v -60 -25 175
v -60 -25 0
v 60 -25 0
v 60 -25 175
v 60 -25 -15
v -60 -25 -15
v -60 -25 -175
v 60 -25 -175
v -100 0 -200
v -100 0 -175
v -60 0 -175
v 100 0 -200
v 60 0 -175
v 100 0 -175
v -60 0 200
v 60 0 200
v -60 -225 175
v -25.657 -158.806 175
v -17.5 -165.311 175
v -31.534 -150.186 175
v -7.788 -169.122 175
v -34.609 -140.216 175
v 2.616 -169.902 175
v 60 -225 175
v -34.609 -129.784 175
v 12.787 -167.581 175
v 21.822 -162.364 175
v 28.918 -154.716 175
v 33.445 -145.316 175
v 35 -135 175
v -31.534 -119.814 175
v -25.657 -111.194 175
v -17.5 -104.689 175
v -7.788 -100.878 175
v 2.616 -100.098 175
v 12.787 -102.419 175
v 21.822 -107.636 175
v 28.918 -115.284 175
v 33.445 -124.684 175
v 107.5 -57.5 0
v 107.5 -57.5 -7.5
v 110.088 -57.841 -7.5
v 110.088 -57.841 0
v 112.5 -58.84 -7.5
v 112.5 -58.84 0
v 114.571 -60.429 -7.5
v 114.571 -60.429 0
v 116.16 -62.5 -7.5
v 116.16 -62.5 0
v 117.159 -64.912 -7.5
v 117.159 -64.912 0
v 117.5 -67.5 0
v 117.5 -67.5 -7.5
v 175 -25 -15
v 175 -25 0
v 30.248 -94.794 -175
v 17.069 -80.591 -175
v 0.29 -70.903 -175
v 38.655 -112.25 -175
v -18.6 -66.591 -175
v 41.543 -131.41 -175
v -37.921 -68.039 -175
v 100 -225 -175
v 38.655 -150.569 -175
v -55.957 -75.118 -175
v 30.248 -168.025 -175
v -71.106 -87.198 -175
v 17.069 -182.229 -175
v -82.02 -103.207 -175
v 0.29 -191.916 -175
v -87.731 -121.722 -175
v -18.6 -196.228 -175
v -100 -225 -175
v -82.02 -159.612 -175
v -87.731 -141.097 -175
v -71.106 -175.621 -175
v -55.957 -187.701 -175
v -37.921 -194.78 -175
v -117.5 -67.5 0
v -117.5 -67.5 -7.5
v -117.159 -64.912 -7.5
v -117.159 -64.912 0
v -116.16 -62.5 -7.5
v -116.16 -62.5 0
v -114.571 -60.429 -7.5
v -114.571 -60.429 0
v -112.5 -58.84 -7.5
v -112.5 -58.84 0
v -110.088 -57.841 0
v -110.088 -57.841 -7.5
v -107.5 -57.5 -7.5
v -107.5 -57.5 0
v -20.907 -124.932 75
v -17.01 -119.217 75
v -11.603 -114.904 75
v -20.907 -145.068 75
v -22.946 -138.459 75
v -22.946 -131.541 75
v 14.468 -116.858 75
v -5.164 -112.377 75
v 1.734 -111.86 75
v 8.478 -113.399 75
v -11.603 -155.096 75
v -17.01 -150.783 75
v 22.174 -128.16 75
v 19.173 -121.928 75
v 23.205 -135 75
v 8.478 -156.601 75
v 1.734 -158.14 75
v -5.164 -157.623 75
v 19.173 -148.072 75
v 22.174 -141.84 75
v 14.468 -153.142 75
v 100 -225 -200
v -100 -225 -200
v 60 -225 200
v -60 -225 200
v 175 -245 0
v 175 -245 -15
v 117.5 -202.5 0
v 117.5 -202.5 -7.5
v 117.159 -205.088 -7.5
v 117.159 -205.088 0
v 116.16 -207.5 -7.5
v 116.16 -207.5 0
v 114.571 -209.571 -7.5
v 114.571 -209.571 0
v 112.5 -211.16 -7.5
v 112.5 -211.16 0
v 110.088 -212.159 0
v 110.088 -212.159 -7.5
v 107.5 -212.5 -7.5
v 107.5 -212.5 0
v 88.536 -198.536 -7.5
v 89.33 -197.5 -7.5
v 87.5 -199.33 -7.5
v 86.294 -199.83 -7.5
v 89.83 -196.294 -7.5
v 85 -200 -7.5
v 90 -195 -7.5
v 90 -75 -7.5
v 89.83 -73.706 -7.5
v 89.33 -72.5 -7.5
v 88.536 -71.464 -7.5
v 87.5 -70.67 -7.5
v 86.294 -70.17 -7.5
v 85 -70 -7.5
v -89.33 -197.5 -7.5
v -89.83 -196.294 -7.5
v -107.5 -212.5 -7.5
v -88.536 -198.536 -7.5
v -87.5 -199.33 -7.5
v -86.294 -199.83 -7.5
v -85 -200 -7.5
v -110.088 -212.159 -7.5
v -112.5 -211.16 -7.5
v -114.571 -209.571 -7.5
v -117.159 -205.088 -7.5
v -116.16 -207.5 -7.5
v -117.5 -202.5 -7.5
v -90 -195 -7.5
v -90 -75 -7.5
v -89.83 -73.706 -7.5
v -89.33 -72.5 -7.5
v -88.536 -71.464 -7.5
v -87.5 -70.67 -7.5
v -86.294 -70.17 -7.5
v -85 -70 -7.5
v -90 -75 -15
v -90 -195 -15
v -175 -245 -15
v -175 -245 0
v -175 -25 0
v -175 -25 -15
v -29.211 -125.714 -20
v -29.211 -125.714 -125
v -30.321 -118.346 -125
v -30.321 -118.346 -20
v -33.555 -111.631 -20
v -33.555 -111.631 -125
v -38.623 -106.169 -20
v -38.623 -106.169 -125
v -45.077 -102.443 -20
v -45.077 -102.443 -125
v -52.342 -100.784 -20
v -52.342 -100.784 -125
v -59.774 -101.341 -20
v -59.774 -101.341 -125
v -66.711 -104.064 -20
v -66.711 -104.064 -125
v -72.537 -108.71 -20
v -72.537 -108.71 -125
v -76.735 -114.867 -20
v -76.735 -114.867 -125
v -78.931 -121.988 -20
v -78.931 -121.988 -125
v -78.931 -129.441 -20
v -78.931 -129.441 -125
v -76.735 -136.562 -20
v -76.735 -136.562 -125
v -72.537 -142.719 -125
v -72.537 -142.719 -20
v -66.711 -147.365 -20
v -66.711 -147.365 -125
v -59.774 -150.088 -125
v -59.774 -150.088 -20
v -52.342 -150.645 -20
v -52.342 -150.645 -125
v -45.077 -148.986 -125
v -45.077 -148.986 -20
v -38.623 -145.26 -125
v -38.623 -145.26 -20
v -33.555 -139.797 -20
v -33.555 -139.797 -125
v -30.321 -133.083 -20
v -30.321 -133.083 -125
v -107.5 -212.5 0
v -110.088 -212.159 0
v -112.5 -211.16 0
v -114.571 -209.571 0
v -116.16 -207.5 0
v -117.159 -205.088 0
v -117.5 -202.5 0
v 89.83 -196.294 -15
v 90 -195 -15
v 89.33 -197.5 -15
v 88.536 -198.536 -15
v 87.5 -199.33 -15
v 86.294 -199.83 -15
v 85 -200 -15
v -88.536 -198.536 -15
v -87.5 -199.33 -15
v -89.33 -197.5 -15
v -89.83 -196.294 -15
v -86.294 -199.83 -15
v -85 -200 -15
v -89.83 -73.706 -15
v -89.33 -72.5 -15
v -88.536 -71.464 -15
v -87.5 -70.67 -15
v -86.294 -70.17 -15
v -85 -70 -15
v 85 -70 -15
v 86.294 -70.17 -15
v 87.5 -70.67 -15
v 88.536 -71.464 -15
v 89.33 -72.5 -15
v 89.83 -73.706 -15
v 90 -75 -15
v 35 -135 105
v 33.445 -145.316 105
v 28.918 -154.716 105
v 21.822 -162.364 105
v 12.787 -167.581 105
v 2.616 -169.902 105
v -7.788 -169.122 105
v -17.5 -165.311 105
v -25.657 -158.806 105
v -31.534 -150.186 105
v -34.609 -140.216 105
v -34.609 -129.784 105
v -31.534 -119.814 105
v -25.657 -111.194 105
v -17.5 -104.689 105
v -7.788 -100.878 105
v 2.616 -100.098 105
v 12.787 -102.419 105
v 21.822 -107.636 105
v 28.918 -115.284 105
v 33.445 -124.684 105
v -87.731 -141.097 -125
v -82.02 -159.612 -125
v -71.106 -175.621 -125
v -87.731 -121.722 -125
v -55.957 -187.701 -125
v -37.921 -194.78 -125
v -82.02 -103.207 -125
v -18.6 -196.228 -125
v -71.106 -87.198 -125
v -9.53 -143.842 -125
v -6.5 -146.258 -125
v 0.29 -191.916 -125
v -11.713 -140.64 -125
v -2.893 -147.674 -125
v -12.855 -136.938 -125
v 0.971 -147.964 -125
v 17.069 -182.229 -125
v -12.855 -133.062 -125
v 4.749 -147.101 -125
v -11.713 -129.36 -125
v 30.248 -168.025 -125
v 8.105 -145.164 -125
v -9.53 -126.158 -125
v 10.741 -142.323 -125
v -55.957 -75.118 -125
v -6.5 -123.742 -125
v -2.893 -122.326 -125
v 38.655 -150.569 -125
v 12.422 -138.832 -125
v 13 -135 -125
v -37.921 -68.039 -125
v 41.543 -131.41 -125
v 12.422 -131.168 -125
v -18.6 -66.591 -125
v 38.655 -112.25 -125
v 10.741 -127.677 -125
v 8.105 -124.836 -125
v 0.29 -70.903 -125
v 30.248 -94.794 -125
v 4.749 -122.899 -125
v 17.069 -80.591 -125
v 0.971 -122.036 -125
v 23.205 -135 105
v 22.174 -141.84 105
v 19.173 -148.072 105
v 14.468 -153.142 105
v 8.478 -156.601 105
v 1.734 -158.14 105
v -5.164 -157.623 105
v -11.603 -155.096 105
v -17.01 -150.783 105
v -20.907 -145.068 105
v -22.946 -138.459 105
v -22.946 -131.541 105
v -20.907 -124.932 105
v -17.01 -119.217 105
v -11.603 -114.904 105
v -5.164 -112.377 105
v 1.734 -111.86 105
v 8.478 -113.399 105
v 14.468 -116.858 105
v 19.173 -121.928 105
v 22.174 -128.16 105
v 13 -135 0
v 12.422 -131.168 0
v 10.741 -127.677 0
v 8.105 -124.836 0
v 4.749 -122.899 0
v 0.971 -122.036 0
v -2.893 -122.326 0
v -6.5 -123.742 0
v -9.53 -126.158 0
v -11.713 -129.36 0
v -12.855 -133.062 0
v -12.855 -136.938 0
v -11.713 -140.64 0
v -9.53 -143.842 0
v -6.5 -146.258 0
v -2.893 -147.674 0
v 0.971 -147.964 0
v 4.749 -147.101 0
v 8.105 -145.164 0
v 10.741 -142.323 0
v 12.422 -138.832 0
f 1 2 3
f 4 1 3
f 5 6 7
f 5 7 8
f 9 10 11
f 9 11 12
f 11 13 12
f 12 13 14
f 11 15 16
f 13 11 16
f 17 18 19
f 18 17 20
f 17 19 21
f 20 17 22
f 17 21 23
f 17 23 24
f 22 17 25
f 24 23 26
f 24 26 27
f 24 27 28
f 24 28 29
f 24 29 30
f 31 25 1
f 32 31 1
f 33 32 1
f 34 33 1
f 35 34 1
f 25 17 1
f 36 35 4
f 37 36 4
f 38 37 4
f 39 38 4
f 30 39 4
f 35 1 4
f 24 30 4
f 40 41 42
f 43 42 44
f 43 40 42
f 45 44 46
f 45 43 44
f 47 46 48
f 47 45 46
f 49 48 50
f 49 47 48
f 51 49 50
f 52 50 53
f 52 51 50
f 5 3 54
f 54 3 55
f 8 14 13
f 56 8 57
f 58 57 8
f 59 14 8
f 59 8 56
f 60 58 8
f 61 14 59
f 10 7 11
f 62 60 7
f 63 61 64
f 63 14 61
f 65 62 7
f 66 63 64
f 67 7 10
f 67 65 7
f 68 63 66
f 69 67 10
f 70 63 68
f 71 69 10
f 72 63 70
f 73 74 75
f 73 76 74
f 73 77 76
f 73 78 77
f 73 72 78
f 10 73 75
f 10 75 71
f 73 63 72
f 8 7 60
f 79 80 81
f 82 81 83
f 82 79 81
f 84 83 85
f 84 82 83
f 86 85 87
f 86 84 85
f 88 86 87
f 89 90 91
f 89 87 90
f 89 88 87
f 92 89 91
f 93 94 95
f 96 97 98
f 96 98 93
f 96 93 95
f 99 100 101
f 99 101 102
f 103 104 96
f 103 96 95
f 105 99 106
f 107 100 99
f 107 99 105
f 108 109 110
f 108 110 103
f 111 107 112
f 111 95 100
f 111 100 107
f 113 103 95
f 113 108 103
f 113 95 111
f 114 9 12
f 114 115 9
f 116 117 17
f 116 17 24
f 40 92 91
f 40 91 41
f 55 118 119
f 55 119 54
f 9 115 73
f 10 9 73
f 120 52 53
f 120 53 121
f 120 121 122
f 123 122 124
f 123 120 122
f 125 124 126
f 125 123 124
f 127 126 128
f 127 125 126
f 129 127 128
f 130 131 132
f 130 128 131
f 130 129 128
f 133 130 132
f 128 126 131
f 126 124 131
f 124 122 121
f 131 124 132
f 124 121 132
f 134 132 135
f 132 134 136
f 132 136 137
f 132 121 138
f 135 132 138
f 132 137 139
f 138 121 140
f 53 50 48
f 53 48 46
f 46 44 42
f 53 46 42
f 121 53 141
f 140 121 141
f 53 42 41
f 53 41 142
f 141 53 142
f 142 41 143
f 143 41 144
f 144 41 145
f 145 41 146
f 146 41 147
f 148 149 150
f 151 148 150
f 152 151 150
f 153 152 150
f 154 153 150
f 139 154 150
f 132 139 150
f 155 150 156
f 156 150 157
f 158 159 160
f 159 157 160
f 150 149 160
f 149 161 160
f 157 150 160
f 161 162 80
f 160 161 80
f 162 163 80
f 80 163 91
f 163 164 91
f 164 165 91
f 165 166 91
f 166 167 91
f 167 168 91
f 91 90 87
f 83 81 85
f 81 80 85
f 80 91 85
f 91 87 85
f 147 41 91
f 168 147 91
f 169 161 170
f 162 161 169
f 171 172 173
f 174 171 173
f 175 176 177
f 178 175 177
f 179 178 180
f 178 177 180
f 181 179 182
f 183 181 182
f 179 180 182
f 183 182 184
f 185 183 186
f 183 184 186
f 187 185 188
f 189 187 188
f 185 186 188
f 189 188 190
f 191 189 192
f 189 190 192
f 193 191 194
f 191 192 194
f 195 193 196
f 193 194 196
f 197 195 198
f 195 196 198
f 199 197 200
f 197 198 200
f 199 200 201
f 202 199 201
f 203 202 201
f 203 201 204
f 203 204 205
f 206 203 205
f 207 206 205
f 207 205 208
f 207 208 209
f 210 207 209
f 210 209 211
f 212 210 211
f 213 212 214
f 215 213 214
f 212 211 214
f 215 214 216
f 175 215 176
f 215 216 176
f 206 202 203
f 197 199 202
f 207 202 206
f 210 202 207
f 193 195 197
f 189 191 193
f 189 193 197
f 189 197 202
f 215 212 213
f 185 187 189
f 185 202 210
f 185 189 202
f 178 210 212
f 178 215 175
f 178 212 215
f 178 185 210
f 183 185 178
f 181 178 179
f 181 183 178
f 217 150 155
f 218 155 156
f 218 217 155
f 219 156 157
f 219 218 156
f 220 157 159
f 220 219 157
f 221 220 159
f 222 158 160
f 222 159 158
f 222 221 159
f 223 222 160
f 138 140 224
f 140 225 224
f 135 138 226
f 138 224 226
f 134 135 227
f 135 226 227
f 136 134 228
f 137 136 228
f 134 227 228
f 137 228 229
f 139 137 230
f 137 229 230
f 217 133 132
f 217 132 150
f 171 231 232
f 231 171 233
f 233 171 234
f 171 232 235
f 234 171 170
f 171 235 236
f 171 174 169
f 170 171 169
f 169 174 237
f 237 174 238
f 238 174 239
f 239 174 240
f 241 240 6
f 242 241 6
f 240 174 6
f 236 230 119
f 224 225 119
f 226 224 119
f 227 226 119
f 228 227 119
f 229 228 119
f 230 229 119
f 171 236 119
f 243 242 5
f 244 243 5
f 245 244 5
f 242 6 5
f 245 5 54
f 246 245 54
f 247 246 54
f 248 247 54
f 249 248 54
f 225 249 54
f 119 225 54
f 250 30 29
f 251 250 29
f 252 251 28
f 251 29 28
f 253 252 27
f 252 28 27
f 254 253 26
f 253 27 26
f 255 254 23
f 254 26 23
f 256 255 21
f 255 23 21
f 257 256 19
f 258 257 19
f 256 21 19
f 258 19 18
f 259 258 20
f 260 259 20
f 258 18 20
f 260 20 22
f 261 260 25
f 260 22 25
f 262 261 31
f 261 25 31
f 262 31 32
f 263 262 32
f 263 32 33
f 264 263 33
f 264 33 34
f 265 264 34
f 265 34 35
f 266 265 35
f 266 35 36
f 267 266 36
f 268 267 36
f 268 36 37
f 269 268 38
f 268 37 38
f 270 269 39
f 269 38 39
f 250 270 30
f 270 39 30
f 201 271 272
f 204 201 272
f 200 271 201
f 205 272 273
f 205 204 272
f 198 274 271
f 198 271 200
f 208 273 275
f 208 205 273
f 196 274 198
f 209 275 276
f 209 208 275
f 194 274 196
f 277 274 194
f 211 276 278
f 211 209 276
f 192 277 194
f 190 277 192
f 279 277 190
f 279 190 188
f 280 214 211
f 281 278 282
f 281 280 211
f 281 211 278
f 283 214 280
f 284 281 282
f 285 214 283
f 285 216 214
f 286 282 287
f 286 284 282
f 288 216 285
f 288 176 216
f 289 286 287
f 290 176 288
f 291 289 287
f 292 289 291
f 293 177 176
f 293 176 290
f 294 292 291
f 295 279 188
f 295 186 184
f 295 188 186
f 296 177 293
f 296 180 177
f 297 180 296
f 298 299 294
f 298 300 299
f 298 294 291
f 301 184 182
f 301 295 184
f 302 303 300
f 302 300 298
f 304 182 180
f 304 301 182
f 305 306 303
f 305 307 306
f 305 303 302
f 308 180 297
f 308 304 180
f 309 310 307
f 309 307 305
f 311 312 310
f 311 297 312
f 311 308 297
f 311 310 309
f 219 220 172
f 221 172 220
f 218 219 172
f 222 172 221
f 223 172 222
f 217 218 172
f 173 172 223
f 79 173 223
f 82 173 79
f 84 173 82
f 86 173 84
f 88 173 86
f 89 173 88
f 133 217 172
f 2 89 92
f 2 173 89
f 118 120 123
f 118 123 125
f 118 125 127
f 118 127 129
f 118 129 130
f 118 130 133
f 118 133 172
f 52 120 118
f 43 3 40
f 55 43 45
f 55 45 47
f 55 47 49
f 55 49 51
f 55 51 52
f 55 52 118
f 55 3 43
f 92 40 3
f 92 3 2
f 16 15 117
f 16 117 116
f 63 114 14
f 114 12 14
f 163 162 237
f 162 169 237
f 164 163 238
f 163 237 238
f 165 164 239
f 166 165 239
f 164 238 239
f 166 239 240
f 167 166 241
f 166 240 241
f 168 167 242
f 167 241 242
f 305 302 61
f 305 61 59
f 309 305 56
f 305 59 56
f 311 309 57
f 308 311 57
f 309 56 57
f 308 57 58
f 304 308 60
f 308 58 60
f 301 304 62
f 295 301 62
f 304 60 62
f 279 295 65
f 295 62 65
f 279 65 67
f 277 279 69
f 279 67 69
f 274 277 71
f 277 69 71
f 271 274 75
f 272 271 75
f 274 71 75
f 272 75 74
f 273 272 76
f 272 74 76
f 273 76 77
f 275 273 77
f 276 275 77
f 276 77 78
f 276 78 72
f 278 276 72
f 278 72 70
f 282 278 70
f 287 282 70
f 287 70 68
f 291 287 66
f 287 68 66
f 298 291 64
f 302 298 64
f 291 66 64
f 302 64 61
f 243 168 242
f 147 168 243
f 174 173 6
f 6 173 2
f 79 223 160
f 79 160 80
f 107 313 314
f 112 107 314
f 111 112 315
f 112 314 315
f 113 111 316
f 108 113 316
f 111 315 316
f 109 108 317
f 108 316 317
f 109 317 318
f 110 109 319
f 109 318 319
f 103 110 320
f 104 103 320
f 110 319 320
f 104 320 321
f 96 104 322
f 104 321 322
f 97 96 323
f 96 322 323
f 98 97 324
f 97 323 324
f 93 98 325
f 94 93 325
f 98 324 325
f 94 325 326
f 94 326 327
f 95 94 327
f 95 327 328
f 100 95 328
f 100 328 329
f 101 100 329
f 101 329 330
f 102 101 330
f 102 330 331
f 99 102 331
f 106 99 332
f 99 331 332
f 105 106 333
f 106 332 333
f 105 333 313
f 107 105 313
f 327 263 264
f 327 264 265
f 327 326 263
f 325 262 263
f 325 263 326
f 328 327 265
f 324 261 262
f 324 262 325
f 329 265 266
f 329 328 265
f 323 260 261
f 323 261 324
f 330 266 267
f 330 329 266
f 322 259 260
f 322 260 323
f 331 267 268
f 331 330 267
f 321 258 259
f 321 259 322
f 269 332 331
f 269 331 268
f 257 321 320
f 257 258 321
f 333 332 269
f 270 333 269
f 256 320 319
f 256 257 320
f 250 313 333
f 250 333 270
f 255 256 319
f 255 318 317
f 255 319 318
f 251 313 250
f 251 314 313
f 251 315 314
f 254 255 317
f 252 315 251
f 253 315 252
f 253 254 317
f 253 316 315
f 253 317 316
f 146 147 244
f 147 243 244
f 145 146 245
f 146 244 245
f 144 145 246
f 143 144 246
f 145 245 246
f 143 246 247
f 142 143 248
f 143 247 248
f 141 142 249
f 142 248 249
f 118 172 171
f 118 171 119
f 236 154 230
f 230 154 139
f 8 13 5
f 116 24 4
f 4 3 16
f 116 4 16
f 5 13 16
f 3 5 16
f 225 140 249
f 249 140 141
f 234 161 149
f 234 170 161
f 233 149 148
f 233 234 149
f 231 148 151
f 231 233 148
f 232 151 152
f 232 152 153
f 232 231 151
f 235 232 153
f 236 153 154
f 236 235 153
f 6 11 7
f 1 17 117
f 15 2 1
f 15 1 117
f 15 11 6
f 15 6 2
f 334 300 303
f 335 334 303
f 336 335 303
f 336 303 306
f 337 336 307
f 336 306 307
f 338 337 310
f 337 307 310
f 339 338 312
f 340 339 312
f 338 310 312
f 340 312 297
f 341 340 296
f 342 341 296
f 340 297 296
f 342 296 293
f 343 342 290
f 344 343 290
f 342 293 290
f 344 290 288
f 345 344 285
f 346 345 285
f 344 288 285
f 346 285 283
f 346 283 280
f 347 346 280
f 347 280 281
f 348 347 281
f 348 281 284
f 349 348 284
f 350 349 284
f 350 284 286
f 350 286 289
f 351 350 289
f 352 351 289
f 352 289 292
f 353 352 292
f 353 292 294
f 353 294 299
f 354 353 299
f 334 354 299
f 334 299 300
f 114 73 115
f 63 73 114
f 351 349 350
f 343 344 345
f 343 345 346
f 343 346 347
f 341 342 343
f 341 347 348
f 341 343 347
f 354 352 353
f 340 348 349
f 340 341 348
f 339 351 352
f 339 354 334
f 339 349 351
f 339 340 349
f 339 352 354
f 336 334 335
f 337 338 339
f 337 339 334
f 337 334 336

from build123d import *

# Parameters (mm, degrees)
F0_W          = 120
F0_H          = 400
F1_DEPTH      = 25
F2_W          = 120
F2_H          = 25
F3_DEPTH      = 200
F4_R          = 35
F5_DEPTH      = 70
F6_R          = 23.205
F7_DEPTH      = 30
F8_W          = 40
F8_H          = 25
F8_W_2        = 120
F9_DEPTH      = 200
F9_DEPTH_BACK = 25
F10_R         = 65
F11_DEPTH     = 50
F12_R         = 13
F13_DEPTH     = 125
F14_R         = 25
F15_DEPTH     = 105
F16_W         = 350
F16_H         = 220
F17_DEPTH     = 15
F18_W         = 215
F18_H         = 7.5
F18_W_2       = 10
F19_DEPTH     = 155
F20_W         = 180
F20_H         = 130
F20_R         = 13
F21_DEPTH     = 7.5
F22_R         = 5


with BuildPart() as f1:
    # F0 (on Front) → F1 (new body)
    with BuildSketch(Plane.XZ):
        Rectangle(F0_W, F0_H)
    extrude(amount=F1_DEPTH)

    # F2 (on face) → F3 (join)
    with BuildSketch(Plane.XZ.offset(25)):
        with Locations((0, 187.5)):
            Rectangle(F2_W, F2_H)
    extrude(amount=F3_DEPTH)

    # F4 (on face) → F5 (join)
    with BuildSketch(Plane(origin=(0, 0, 175), x_dir=(1, 0, 0), z_dir=(0, 0, -1))):
        with Locations((0, 135)):
            Circle(F4_R)
    extrude(amount=F5_DEPTH)

    # F6 (on face) → F7 (join)
    with BuildSketch(Plane(origin=(0, 0, 105), x_dir=(1, 0, 0), z_dir=(0, 0, -1))):
        with Locations((0, 135)):
            Circle(F6_R)
    extrude(amount=F7_DEPTH)

    # F8 (on face) → F9 (join, two sides)
    with BuildSketch(Plane.XZ.offset(25)) as f9_sk:
        with Locations((-80, -187.5)):
            Rectangle(F8_W, F8_H)
        with Locations((0, -187.5)):
            Rectangle(F8_W_2, F8_H)
        with Locations((80, -187.5)):
            Rectangle(F8_W, F8_H)
    extrude(amount=F9_DEPTH)
    extrude(f9_sk.sketch, amount=-F9_DEPTH_BACK)

    # F10 (on face) → F11 (join)
    with BuildSketch(Plane.XY.offset(-175)):
        with Locations((-23.4574452043, -131.4095705748)):
            Circle(F10_R)
    extrude(amount=F11_DEPTH)

    # F12 (on face) → F13 (join)
    with BuildSketch(Plane.XY.offset(-125)):
        with Locations((0, -135)):
            Circle(F12_R)
    extrude(amount=F13_DEPTH)

    # F14 (on face) → F15 (join)
    with BuildSketch(Plane.XY.offset(-125)):
        with Locations((-54.2105034057, -125.7144563701)):
            Circle(F14_R)
    extrude(amount=F15_DEPTH)

    # F16 (on Top) → F17 (join)
    with BuildSketch(Plane.XY):
        with Locations((0, -135)):
            Rectangle(F16_W, F16_H)
        with BuildLine():
            ThreePointArc((117.5, -202.5), (114.5710678119, -209.5710678119), (107.5, -212.5))
            Line((107.5, -212.5), (-107.5, -212.5))
            ThreePointArc((-107.5, -212.5), (-114.5710678119, -209.5710678119), (-117.5, -202.5))
            Line((-117.5, -202.5), (-117.5, -67.5))
            ThreePointArc((-117.5, -67.5), (-114.5710678119, -60.4289321881), (-107.5, -57.5))
            Line((-107.5, -57.5), (107.5, -57.5))
            ThreePointArc((107.5, -57.5), (114.5710678119, -60.4289321881), (117.5, -67.5))
            Line((117.5, -67.5), (117.5, -202.5))
        make_face(mode=Mode.SUBTRACT)
    extrude(amount=-F17_DEPTH)

    # F18 (on face) → F19 (join)
    with BuildSketch(Plane.XZ.offset(57.5)):
        with Locations((0, -11.25)):
            Rectangle(F18_W, F18_H)
        with Locations((-112.5, -11.25)):
            Rectangle(F18_W_2, F18_H)
        with Locations((112.5, -11.25)):
            Rectangle(F18_W_2, F18_H)
    extrude(amount=F19_DEPTH)

    # F20 (on face) → F21 (cut, through all)
    with BuildSketch(Plane.XY.offset(-7.5)):
        with Locations((0, -135)):
            Rectangle(F20_W, F20_H)
        with Locations((0, -135)):
            Circle(F20_R, mode=Mode.SUBTRACT)
    extrude(amount=-F21_DEPTH, mode=Mode.SUBTRACT)

    # F22
    f22_edges = [f1.edges().sort_by_distance(p)[0] for p in [
        (-90, -70, -11.25),
        (90, -70, -11.25),
        (-90, -200, -11.25),
        (90, -200, -11.25),
    ]]
    fillet(f22_edges, radius=F22_R)


solid = f1.part
